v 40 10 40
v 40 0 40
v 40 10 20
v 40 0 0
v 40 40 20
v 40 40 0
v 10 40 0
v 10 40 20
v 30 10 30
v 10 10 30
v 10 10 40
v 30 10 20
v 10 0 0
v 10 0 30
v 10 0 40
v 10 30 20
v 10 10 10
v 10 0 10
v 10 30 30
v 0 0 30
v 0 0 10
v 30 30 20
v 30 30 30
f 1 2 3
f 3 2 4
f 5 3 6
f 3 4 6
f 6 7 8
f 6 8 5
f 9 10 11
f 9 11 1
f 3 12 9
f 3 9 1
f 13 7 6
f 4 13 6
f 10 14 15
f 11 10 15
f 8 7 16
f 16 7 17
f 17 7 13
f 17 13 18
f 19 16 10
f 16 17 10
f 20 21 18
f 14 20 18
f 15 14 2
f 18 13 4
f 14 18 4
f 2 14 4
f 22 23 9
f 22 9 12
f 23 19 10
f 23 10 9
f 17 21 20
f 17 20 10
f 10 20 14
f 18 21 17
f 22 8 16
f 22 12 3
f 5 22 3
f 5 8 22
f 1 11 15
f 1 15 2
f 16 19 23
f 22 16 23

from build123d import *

# Parameters (mm, degrees)
SKETCH1_W           = 40
SKETCH1_H           = 40
BOSS_EXTRUDE1_DEPTH = 40
SKETCH2_W           = 10
SKETCH2_H           = 30
CUT_EXTRUDE1_DEPTH  = 40
SKETCH3_W           = 10
SKETCH3_H           = 10
CUT_EXTRUDE2_DEPTH  = 40
SKETCH4_W           = 30
SKETCH4_H           = 10
CUT_EXTRUDE3_DEPTH  = 30
SKETCH5_W           = 10
SKETCH5_H           = 10
CUT_EXTRUDE4_DEPTH  = 30
SKETCH6_W           = 20
SKETCH6_H           = 10
CUT_EXTRUDE6_DEPTH  = 10


with BuildPart() as part:
    # Sketch1 → Boss-Extrude1 (new body)
    with BuildSketch(Plane.XY):
        with Locations((20, 20)):
            Rectangle(SKETCH1_W, SKETCH1_H)
    extrude(amount=BOSS_EXTRUDE1_DEPTH)

    # Sketch2 → Cut-Extrude1 (cut)
    with BuildSketch(Plane.XY.offset(40)):
        with Locations((5, 25)):
            Rectangle(SKETCH2_W, SKETCH2_H)
        Polygon((0, 0), (10, 10), (0, 10), align=None)
    extrude(amount=-CUT_EXTRUDE1_DEPTH, mode=Mode.SUBTRACT)

    # Sketch3 → Cut-Extrude2 (cut)
    with BuildSketch(Plane.XZ):
        with Locations((5, 5)):
            Rectangle(SKETCH3_W, SKETCH3_H)
        with Locations((5, 35)):
            Rectangle(SKETCH3_W, SKETCH3_H)
    extrude(amount=-CUT_EXTRUDE2_DEPTH, mode=Mode.SUBTRACT)

    # Sketch4 → Cut-Extrude3 (cut)
    with BuildSketch(Plane(origin=(0, 40, 0), x_dir=(1, 0, 0), z_dir=(0, 1, 0))):
        with Locations((25, -35)):
            Rectangle(SKETCH4_W, SKETCH4_H)
    extrude(amount=-CUT_EXTRUDE3_DEPTH, mode=Mode.SUBTRACT)

    # Sketch5 → Cut-Extrude4 (cut)
    with BuildSketch(Plane(origin=(0, 40, 0), x_dir=(1, 0, 0), z_dir=(0, 1, 0))):
        with Locations((35, -25)):
            Rectangle(SKETCH5_W, SKETCH5_H)
    extrude(amount=-CUT_EXTRUDE4_DEPTH, mode=Mode.SUBTRACT)

    # Sketch6 → Cut-Extrude6 (cut)
    with BuildSketch(Plane.XY.offset(30)):
        with Locations((20, 35)):
            Rectangle(SKETCH6_W, SKETCH6_H)
    extrude(amount=-CUT_EXTRUDE6_DEPTH, mode=Mode.SUBTRACT)


solid = part.part
